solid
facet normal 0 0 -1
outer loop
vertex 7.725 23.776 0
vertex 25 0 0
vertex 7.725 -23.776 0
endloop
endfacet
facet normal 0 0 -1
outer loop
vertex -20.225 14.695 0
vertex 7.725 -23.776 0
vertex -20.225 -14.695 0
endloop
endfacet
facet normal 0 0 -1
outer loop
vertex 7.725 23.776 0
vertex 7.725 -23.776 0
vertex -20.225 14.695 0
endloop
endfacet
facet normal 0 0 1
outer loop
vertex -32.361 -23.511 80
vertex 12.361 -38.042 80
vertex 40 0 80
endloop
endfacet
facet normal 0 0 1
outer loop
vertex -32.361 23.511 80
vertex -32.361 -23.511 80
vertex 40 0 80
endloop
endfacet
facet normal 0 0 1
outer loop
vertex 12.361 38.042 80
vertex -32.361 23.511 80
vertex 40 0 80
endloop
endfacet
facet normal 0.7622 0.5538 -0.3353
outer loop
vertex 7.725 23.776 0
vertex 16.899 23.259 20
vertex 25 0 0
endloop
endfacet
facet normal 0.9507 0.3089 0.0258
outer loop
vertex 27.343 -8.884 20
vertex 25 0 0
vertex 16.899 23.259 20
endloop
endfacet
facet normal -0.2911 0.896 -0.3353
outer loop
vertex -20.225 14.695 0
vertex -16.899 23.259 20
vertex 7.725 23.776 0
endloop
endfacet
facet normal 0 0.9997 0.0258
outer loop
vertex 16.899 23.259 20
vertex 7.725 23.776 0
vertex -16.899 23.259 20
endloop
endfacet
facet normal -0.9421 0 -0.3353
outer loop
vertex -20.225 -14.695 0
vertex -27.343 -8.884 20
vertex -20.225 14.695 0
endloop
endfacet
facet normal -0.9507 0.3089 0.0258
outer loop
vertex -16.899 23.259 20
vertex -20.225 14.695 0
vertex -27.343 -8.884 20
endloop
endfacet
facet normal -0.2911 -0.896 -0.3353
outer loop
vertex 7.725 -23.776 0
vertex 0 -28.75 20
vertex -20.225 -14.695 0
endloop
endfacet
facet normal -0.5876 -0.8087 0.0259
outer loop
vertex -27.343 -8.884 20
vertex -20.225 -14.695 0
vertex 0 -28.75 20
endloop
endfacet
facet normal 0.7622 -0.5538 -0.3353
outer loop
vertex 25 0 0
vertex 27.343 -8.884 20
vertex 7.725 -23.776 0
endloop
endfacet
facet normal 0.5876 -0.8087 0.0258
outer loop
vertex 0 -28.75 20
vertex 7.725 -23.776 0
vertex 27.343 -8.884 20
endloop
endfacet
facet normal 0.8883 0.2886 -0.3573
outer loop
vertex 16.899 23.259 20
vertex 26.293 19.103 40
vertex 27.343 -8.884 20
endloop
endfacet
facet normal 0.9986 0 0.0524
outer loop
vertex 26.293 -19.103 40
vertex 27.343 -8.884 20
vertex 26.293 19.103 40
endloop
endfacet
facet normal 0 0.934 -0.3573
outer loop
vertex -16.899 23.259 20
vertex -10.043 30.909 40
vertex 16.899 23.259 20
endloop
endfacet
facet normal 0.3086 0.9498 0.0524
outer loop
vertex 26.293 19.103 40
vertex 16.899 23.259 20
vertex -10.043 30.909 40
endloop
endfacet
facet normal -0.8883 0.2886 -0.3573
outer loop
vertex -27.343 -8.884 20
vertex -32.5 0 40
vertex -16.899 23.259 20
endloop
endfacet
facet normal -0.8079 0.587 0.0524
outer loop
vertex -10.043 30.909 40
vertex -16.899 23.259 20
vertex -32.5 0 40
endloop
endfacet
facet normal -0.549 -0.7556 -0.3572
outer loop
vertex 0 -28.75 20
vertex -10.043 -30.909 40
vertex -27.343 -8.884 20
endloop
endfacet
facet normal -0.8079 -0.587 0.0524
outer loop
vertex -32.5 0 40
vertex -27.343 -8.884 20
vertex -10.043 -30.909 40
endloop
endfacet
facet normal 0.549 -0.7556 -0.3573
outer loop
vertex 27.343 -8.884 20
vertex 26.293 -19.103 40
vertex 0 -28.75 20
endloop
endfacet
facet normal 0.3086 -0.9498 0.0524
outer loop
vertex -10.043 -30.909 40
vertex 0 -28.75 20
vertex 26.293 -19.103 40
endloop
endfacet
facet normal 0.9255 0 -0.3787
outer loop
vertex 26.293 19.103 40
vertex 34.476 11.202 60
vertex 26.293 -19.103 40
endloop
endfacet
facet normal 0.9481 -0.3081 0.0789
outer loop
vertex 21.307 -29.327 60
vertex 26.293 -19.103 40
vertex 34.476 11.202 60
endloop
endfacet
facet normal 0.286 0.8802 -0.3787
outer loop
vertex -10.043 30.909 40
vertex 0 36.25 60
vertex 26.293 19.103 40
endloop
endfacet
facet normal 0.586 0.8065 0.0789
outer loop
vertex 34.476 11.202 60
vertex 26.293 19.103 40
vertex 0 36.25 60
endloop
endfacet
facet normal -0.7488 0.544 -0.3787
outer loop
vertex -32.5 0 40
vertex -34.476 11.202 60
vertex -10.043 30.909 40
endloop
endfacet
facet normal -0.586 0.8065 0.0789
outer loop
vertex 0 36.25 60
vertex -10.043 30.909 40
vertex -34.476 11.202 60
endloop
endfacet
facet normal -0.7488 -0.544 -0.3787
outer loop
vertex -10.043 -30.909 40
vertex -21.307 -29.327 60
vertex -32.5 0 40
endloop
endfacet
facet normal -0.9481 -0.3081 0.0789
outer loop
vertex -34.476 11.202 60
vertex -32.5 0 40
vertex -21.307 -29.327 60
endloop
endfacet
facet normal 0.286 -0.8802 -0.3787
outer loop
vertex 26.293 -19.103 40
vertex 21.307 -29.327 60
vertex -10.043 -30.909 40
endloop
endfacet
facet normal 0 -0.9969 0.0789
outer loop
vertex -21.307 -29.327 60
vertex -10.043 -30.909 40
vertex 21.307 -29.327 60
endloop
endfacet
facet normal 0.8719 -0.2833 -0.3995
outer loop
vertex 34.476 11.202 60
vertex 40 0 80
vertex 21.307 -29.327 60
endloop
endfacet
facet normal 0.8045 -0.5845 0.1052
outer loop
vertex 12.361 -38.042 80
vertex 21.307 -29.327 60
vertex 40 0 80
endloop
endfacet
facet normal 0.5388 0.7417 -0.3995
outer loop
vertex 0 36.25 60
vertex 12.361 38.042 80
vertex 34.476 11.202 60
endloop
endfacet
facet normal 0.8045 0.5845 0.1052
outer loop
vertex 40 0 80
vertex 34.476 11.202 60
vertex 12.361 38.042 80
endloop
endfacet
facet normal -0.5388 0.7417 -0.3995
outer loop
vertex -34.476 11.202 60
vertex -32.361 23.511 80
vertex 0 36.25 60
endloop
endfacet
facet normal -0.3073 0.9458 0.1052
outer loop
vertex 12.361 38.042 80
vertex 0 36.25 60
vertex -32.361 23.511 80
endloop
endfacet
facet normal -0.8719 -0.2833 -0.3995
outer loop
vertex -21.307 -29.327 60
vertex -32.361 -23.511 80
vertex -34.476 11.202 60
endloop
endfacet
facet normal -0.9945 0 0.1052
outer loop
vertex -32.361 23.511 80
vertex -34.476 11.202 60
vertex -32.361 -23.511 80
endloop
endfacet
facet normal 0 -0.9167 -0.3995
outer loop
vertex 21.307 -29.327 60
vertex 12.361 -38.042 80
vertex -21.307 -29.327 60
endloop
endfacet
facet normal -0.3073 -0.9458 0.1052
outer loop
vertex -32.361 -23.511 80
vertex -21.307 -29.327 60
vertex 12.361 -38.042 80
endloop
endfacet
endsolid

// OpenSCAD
// [FL_INDEX: keywords="openscad, 3d_parametric, Customizable_Twisted_Polygon_Vase, csg_solid" | COT="Parametric OpenSCAD design from 3DCodeverse"]
// Title: Customizable Twisted Polygon Vase

// Customizable Twisted Polygon Vase

use <MCAD/regular_shapes.scad>;

/* [Vase Design] */

// Vases is an extruded regular polygon
number_of_sides = 5;

// Height of vase (mm)
vase_height = 80;

// Bottom circumradius (mm from center to corner)
bottom_radius = 25;

// Top circumradius (mm from center to corner)
top_radius = 40;

// Clockwise twist of top surface relative to bottom (degrees).
top_rotation = 72;

// Low values yield a faceted appearance. High values yield a smooth appearance. No effect if 0 rotation.
slice_layers = 4;

/* [Hidden] */

top_scale = top_radius / bottom_radius;

linear_extrude(
		height = vase_height,
		twist  = top_rotation,
		slices = slice_layers,
		scale  = top_scale)

reg_polygon(
		sides  = number_of_sides,
		radius = bottom_radius);
